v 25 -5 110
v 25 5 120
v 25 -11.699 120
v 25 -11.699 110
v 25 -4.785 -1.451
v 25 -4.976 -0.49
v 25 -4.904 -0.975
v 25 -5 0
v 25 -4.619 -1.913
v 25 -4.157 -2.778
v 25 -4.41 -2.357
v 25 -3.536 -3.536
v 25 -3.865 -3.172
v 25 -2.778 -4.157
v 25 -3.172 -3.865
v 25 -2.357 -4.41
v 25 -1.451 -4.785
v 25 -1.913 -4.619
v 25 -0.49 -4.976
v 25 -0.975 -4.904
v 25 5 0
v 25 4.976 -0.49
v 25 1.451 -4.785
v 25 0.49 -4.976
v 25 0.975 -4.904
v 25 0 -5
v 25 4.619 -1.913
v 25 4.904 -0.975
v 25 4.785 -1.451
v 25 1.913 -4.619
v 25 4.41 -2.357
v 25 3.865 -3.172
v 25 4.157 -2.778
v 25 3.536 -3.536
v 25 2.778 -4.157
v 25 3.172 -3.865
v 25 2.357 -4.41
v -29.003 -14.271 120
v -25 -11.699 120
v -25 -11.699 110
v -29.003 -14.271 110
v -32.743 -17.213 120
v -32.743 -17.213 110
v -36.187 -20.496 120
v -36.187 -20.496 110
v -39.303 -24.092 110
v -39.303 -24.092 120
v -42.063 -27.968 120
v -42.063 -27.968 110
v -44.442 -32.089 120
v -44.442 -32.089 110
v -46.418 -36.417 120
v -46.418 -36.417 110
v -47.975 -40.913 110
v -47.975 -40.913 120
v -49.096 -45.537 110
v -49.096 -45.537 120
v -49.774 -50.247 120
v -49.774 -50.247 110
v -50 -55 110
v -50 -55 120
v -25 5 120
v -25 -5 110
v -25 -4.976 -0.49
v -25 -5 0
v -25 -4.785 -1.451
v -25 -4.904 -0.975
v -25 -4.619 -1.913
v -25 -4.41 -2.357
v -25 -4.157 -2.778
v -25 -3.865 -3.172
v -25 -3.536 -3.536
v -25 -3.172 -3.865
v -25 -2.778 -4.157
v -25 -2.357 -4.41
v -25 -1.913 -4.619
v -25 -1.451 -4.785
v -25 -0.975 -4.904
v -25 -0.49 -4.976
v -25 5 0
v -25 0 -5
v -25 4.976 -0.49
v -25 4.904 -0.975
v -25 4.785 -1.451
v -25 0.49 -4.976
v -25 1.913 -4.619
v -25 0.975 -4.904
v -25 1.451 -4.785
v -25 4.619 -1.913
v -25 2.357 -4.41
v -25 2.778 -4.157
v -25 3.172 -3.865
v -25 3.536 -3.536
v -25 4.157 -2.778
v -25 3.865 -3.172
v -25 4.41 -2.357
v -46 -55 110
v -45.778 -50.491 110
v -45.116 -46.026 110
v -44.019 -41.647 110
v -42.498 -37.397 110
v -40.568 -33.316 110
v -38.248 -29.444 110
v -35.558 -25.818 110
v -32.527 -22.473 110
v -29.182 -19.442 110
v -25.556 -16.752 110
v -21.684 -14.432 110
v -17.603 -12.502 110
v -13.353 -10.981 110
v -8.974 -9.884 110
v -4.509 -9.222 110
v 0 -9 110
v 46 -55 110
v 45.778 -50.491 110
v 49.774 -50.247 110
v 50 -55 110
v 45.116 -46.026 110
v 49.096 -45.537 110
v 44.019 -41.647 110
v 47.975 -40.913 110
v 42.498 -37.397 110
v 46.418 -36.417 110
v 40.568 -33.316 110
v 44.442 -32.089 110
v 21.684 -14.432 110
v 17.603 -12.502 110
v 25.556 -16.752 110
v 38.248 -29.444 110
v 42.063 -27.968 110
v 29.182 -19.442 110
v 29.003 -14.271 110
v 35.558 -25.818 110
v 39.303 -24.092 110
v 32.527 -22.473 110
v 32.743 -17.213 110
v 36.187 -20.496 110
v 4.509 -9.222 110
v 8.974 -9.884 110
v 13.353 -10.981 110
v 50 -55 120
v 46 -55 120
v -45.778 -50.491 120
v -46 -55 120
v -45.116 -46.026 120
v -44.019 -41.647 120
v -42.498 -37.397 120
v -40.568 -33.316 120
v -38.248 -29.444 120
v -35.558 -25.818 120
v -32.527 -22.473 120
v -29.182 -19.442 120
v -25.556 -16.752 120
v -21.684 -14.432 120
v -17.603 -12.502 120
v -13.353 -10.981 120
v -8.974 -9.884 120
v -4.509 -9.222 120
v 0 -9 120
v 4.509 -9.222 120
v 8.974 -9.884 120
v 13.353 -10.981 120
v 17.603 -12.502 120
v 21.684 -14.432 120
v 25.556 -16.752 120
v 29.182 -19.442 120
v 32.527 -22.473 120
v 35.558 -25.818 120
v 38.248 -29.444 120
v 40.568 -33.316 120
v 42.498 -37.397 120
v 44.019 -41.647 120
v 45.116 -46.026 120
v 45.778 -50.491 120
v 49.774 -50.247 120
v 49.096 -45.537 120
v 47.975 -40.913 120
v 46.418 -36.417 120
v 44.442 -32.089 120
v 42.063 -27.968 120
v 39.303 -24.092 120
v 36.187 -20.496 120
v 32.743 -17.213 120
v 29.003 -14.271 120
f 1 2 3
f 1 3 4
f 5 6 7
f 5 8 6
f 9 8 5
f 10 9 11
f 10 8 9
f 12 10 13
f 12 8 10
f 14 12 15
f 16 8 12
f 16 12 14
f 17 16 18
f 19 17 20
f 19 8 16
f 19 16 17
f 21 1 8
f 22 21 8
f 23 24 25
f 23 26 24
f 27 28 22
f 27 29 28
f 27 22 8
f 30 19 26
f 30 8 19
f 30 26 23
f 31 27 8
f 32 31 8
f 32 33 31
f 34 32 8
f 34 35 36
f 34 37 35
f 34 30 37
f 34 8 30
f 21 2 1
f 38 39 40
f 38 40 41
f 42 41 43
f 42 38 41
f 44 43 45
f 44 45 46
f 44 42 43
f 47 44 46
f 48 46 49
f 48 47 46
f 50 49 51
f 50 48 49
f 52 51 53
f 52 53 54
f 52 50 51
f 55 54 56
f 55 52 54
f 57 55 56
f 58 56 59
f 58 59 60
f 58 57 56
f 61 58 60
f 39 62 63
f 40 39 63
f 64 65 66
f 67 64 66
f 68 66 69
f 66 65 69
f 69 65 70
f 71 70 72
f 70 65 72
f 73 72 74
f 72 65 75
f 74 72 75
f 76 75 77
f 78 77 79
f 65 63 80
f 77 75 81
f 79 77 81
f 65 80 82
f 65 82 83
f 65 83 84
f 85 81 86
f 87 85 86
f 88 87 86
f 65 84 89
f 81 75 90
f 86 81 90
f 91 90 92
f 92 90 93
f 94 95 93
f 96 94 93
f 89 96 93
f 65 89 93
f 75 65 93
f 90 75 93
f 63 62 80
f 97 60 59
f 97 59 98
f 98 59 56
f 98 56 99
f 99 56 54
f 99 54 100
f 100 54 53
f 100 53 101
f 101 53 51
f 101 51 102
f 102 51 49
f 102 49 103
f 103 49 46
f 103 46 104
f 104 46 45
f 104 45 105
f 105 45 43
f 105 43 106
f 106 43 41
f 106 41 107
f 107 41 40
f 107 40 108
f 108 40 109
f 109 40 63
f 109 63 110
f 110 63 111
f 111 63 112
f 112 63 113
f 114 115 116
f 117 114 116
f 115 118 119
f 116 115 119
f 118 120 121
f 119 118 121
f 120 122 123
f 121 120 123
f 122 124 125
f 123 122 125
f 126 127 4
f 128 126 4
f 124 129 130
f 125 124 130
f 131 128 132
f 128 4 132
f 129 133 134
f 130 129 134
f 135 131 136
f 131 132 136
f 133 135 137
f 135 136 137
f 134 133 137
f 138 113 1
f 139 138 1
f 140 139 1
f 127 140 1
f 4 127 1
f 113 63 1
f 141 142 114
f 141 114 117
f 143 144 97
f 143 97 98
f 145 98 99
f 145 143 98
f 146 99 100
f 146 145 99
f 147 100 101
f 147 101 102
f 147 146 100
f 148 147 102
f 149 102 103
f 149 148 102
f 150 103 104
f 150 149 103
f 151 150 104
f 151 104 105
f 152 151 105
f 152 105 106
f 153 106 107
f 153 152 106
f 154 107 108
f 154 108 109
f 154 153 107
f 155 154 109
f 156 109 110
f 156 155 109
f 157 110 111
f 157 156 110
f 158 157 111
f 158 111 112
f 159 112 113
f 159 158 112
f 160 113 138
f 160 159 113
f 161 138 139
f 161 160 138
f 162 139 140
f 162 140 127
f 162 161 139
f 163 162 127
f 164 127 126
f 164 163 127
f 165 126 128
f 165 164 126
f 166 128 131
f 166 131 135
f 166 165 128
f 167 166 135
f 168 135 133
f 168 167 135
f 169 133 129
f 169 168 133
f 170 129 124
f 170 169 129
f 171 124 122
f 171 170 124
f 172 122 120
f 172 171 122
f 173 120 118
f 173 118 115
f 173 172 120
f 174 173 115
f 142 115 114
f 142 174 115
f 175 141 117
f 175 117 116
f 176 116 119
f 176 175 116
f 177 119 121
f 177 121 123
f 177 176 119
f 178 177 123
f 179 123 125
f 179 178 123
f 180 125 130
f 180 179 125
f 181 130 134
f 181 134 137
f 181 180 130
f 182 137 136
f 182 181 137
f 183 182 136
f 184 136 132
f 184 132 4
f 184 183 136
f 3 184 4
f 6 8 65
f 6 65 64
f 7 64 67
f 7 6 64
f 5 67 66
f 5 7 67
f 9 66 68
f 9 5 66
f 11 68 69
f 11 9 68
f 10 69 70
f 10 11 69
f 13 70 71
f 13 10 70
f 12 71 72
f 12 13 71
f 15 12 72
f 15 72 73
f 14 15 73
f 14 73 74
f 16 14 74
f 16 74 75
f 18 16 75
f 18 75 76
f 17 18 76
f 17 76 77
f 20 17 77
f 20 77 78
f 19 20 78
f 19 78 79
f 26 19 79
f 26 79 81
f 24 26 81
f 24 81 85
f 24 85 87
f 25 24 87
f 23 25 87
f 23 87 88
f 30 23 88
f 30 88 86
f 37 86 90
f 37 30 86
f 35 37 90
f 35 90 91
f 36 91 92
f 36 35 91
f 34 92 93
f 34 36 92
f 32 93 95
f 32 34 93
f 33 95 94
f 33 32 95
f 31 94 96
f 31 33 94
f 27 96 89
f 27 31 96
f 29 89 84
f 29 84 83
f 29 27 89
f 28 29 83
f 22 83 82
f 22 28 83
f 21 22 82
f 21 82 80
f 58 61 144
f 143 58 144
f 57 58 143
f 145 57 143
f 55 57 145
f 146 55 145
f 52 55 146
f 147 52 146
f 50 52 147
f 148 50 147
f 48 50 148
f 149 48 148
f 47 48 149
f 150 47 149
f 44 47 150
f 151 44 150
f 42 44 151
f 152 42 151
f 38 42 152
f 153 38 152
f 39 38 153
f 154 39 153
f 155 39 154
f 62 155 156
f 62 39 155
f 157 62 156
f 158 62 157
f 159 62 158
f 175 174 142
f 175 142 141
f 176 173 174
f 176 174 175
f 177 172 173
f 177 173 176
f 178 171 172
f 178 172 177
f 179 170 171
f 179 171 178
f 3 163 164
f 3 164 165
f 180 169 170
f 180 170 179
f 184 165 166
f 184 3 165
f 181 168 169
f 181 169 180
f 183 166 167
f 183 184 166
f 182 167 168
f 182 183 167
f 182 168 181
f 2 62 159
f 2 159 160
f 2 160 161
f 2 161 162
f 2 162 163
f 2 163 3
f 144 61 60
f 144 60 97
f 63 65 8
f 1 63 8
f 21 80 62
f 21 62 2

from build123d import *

# Parameters (mm, degrees)
SKETCH_1_W      = 50
SKETCH_1_H      = 10
EXTRUDE_1_DEPTH = 120
EXTRUDE_2_DEPTH = 10
SKETCH_2_R      = 5
EXTRUDE_3_DEPTH = 50


with BuildPart() as part:
    # 草图1 → 凸台-拉伸1 (new body)
    with BuildSketch(Plane.XY):
        Rectangle(SKETCH_1_W, SKETCH_1_H)
    extrude(amount=EXTRUDE_1_DEPTH)

    # 草图3 → 凸台-拉伸2 (add)
    with BuildSketch(Plane.XY.offset(120)):
        with BuildLine():
            Line((-50, -55), (-46, -55))
            ThreePointArc((-46, -55), (0, -9), (46, -55))
            Line((46, -55), (50, -55))
            ThreePointArc((50, -55), (43.301270189, -30), (25, -11.698729811))
            Line((25, -11.698729811), (25, -5))
            Line((25, -5), (-25, -5))
            Line((-25, -5), (-25, -11.698729811))
            ThreePointArc((-25, -11.698729811), (-43.301270189, -30), (-50, -55))
        make_face()
    extrude(amount=-EXTRUDE_2_DEPTH)

    # 草图2 → 凸台-拉伸3 (add)
    with BuildSketch(Plane(origin=(25, 0, 0), x_dir=(0, 0, -1), z_dir=(1, 0, 0))):
        Circle(SKETCH_2_R)
    extrude(amount=-EXTRUDE_3_DEPTH)


solid = part.part
